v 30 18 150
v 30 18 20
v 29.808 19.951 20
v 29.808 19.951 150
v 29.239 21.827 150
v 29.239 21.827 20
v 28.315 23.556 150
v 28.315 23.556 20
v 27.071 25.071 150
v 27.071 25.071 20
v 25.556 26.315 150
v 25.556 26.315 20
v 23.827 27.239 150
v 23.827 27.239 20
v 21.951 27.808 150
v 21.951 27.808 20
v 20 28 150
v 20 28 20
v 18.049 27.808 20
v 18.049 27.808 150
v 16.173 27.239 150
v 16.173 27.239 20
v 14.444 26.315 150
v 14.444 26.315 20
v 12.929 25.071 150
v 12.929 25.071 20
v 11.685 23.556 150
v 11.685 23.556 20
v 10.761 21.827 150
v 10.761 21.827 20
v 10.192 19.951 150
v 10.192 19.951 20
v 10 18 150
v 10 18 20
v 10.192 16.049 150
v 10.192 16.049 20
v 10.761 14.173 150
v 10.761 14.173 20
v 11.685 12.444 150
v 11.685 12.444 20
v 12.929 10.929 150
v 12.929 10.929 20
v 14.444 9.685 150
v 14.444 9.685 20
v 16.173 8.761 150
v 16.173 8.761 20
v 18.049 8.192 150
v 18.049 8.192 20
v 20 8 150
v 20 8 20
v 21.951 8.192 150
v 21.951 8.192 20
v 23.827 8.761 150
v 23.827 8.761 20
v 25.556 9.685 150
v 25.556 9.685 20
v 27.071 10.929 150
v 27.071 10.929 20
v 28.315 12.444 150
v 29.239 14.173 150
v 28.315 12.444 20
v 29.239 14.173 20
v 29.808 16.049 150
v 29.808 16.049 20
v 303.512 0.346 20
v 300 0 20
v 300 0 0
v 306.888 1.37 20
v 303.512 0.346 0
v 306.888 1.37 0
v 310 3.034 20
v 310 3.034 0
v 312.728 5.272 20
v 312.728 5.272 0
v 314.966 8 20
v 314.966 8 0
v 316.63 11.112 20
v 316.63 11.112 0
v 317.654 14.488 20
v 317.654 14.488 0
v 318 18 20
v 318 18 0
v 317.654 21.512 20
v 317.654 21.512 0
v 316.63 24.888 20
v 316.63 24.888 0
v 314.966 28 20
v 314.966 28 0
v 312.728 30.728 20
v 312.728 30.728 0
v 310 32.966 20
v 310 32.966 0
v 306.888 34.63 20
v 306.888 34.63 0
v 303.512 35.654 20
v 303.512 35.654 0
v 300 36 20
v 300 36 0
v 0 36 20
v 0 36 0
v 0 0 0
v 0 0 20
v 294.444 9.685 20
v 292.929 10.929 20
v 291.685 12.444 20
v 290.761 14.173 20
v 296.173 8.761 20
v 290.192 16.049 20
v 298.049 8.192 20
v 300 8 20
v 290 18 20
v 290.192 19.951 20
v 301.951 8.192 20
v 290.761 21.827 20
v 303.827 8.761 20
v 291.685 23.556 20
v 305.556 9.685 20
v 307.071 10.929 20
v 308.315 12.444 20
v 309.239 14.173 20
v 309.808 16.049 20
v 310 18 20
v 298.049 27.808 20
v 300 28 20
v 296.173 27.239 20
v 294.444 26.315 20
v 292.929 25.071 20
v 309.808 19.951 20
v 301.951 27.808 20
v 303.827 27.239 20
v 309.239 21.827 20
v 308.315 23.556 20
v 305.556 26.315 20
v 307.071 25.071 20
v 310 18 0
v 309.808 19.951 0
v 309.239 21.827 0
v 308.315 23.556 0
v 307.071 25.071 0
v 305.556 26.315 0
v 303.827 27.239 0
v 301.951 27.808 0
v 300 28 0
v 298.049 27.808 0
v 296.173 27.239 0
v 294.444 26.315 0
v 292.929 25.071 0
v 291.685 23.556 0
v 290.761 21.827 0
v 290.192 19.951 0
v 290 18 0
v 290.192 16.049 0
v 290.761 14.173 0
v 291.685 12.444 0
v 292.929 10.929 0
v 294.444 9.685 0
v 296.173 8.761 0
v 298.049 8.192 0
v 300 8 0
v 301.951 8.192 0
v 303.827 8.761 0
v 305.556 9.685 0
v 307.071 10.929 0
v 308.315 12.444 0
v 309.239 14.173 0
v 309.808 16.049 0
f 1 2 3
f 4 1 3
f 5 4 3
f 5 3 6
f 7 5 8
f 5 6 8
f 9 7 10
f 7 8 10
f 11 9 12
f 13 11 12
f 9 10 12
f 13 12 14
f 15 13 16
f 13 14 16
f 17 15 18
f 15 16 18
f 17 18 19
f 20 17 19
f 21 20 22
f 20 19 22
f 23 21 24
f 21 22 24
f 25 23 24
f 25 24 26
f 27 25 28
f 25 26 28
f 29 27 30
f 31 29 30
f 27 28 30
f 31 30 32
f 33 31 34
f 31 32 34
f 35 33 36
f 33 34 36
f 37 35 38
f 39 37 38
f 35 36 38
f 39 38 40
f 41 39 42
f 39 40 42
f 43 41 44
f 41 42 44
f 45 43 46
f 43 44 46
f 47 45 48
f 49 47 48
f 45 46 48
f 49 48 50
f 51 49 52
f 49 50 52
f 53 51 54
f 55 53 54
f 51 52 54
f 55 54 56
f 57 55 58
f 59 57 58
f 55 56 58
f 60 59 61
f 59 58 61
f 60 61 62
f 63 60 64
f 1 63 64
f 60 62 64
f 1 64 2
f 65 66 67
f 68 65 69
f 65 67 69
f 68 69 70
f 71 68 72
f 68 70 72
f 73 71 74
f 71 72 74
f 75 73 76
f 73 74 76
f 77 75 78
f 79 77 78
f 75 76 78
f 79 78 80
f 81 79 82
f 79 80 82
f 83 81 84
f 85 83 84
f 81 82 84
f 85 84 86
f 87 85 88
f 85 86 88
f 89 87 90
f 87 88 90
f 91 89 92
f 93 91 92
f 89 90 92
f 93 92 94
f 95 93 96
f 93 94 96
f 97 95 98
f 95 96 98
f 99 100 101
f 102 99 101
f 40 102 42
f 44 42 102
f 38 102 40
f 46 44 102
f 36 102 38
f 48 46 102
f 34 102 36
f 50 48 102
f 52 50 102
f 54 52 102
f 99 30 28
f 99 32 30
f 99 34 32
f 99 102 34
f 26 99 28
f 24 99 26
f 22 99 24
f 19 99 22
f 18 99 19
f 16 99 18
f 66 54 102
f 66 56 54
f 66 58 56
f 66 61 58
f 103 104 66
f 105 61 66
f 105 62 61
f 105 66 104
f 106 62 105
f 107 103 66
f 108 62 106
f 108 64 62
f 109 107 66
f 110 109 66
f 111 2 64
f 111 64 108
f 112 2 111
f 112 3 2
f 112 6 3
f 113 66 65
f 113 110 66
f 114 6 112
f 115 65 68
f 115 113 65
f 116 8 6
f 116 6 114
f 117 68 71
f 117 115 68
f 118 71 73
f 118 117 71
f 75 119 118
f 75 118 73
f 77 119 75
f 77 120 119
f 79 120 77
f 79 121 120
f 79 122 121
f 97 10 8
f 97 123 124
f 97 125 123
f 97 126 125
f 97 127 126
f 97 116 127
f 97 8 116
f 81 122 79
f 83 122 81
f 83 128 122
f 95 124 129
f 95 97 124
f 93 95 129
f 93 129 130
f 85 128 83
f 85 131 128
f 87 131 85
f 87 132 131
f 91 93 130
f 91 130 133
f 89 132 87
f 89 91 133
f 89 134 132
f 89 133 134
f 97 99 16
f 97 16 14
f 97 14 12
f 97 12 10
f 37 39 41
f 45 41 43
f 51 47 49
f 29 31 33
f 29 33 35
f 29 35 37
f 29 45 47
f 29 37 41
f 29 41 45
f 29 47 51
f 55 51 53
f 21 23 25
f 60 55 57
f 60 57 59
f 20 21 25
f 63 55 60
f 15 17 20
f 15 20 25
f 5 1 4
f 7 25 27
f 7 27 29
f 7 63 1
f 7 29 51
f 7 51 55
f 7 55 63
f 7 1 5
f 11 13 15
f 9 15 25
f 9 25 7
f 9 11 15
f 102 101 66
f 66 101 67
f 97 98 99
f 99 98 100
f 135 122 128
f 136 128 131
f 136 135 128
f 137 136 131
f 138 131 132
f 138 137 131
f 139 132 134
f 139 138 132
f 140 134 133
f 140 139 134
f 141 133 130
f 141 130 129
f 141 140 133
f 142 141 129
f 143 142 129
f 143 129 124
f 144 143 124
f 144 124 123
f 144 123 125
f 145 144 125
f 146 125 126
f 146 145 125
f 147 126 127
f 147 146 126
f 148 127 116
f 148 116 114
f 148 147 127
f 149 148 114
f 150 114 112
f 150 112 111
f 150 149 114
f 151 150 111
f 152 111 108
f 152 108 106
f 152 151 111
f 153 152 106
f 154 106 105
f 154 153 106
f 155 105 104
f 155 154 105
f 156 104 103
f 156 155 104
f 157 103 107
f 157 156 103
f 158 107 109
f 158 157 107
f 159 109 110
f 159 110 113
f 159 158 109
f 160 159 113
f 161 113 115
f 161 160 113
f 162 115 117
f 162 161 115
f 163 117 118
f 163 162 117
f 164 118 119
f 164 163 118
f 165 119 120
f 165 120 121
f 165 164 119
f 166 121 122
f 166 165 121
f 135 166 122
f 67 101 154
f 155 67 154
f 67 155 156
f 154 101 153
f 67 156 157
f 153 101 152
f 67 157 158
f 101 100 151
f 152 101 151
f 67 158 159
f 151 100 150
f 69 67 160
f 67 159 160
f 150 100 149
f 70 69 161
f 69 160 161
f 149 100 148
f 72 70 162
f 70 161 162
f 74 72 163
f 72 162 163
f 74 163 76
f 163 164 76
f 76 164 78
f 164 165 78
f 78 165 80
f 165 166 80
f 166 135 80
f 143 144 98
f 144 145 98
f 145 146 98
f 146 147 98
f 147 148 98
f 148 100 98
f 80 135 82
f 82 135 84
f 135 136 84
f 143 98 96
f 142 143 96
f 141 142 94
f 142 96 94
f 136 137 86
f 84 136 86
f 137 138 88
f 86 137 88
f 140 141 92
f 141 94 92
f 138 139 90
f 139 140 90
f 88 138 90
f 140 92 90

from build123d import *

# Parameters (mm, degrees)
ESQUISSE1_R        = 10
BOSS_EXTRU_1_DEPTH = 20
ESQUISSE2_R        = 10
BOSS_EXTRU_2_DEPTH = 130


with BuildPart() as part:
    # Esquisse1 → Boss.-Extru.1 (new body)
    with BuildSketch(Plane.XY):
        with BuildLine():
            Line((0, 0), (300, 0))
            ThreePointArc((300, 0), (318, 18), (300, 36))
            Line((300, 36), (0, 36))
            Line((0, 36), (0, 0))
        make_face()
        with Locations((300, 18)):
            Circle(ESQUISSE1_R, mode=Mode.SUBTRACT)
    extrude(amount=BOSS_EXTRU_1_DEPTH)

    # Esquisse2 → Boss.-Extru.2 (add)
    with BuildSketch(Plane.XY.offset(20)):
        with Locations((20, 18)):
            Circle(ESQUISSE2_R)
    extrude(amount=BOSS_EXTRU_2_DEPTH)


solid = part.part
